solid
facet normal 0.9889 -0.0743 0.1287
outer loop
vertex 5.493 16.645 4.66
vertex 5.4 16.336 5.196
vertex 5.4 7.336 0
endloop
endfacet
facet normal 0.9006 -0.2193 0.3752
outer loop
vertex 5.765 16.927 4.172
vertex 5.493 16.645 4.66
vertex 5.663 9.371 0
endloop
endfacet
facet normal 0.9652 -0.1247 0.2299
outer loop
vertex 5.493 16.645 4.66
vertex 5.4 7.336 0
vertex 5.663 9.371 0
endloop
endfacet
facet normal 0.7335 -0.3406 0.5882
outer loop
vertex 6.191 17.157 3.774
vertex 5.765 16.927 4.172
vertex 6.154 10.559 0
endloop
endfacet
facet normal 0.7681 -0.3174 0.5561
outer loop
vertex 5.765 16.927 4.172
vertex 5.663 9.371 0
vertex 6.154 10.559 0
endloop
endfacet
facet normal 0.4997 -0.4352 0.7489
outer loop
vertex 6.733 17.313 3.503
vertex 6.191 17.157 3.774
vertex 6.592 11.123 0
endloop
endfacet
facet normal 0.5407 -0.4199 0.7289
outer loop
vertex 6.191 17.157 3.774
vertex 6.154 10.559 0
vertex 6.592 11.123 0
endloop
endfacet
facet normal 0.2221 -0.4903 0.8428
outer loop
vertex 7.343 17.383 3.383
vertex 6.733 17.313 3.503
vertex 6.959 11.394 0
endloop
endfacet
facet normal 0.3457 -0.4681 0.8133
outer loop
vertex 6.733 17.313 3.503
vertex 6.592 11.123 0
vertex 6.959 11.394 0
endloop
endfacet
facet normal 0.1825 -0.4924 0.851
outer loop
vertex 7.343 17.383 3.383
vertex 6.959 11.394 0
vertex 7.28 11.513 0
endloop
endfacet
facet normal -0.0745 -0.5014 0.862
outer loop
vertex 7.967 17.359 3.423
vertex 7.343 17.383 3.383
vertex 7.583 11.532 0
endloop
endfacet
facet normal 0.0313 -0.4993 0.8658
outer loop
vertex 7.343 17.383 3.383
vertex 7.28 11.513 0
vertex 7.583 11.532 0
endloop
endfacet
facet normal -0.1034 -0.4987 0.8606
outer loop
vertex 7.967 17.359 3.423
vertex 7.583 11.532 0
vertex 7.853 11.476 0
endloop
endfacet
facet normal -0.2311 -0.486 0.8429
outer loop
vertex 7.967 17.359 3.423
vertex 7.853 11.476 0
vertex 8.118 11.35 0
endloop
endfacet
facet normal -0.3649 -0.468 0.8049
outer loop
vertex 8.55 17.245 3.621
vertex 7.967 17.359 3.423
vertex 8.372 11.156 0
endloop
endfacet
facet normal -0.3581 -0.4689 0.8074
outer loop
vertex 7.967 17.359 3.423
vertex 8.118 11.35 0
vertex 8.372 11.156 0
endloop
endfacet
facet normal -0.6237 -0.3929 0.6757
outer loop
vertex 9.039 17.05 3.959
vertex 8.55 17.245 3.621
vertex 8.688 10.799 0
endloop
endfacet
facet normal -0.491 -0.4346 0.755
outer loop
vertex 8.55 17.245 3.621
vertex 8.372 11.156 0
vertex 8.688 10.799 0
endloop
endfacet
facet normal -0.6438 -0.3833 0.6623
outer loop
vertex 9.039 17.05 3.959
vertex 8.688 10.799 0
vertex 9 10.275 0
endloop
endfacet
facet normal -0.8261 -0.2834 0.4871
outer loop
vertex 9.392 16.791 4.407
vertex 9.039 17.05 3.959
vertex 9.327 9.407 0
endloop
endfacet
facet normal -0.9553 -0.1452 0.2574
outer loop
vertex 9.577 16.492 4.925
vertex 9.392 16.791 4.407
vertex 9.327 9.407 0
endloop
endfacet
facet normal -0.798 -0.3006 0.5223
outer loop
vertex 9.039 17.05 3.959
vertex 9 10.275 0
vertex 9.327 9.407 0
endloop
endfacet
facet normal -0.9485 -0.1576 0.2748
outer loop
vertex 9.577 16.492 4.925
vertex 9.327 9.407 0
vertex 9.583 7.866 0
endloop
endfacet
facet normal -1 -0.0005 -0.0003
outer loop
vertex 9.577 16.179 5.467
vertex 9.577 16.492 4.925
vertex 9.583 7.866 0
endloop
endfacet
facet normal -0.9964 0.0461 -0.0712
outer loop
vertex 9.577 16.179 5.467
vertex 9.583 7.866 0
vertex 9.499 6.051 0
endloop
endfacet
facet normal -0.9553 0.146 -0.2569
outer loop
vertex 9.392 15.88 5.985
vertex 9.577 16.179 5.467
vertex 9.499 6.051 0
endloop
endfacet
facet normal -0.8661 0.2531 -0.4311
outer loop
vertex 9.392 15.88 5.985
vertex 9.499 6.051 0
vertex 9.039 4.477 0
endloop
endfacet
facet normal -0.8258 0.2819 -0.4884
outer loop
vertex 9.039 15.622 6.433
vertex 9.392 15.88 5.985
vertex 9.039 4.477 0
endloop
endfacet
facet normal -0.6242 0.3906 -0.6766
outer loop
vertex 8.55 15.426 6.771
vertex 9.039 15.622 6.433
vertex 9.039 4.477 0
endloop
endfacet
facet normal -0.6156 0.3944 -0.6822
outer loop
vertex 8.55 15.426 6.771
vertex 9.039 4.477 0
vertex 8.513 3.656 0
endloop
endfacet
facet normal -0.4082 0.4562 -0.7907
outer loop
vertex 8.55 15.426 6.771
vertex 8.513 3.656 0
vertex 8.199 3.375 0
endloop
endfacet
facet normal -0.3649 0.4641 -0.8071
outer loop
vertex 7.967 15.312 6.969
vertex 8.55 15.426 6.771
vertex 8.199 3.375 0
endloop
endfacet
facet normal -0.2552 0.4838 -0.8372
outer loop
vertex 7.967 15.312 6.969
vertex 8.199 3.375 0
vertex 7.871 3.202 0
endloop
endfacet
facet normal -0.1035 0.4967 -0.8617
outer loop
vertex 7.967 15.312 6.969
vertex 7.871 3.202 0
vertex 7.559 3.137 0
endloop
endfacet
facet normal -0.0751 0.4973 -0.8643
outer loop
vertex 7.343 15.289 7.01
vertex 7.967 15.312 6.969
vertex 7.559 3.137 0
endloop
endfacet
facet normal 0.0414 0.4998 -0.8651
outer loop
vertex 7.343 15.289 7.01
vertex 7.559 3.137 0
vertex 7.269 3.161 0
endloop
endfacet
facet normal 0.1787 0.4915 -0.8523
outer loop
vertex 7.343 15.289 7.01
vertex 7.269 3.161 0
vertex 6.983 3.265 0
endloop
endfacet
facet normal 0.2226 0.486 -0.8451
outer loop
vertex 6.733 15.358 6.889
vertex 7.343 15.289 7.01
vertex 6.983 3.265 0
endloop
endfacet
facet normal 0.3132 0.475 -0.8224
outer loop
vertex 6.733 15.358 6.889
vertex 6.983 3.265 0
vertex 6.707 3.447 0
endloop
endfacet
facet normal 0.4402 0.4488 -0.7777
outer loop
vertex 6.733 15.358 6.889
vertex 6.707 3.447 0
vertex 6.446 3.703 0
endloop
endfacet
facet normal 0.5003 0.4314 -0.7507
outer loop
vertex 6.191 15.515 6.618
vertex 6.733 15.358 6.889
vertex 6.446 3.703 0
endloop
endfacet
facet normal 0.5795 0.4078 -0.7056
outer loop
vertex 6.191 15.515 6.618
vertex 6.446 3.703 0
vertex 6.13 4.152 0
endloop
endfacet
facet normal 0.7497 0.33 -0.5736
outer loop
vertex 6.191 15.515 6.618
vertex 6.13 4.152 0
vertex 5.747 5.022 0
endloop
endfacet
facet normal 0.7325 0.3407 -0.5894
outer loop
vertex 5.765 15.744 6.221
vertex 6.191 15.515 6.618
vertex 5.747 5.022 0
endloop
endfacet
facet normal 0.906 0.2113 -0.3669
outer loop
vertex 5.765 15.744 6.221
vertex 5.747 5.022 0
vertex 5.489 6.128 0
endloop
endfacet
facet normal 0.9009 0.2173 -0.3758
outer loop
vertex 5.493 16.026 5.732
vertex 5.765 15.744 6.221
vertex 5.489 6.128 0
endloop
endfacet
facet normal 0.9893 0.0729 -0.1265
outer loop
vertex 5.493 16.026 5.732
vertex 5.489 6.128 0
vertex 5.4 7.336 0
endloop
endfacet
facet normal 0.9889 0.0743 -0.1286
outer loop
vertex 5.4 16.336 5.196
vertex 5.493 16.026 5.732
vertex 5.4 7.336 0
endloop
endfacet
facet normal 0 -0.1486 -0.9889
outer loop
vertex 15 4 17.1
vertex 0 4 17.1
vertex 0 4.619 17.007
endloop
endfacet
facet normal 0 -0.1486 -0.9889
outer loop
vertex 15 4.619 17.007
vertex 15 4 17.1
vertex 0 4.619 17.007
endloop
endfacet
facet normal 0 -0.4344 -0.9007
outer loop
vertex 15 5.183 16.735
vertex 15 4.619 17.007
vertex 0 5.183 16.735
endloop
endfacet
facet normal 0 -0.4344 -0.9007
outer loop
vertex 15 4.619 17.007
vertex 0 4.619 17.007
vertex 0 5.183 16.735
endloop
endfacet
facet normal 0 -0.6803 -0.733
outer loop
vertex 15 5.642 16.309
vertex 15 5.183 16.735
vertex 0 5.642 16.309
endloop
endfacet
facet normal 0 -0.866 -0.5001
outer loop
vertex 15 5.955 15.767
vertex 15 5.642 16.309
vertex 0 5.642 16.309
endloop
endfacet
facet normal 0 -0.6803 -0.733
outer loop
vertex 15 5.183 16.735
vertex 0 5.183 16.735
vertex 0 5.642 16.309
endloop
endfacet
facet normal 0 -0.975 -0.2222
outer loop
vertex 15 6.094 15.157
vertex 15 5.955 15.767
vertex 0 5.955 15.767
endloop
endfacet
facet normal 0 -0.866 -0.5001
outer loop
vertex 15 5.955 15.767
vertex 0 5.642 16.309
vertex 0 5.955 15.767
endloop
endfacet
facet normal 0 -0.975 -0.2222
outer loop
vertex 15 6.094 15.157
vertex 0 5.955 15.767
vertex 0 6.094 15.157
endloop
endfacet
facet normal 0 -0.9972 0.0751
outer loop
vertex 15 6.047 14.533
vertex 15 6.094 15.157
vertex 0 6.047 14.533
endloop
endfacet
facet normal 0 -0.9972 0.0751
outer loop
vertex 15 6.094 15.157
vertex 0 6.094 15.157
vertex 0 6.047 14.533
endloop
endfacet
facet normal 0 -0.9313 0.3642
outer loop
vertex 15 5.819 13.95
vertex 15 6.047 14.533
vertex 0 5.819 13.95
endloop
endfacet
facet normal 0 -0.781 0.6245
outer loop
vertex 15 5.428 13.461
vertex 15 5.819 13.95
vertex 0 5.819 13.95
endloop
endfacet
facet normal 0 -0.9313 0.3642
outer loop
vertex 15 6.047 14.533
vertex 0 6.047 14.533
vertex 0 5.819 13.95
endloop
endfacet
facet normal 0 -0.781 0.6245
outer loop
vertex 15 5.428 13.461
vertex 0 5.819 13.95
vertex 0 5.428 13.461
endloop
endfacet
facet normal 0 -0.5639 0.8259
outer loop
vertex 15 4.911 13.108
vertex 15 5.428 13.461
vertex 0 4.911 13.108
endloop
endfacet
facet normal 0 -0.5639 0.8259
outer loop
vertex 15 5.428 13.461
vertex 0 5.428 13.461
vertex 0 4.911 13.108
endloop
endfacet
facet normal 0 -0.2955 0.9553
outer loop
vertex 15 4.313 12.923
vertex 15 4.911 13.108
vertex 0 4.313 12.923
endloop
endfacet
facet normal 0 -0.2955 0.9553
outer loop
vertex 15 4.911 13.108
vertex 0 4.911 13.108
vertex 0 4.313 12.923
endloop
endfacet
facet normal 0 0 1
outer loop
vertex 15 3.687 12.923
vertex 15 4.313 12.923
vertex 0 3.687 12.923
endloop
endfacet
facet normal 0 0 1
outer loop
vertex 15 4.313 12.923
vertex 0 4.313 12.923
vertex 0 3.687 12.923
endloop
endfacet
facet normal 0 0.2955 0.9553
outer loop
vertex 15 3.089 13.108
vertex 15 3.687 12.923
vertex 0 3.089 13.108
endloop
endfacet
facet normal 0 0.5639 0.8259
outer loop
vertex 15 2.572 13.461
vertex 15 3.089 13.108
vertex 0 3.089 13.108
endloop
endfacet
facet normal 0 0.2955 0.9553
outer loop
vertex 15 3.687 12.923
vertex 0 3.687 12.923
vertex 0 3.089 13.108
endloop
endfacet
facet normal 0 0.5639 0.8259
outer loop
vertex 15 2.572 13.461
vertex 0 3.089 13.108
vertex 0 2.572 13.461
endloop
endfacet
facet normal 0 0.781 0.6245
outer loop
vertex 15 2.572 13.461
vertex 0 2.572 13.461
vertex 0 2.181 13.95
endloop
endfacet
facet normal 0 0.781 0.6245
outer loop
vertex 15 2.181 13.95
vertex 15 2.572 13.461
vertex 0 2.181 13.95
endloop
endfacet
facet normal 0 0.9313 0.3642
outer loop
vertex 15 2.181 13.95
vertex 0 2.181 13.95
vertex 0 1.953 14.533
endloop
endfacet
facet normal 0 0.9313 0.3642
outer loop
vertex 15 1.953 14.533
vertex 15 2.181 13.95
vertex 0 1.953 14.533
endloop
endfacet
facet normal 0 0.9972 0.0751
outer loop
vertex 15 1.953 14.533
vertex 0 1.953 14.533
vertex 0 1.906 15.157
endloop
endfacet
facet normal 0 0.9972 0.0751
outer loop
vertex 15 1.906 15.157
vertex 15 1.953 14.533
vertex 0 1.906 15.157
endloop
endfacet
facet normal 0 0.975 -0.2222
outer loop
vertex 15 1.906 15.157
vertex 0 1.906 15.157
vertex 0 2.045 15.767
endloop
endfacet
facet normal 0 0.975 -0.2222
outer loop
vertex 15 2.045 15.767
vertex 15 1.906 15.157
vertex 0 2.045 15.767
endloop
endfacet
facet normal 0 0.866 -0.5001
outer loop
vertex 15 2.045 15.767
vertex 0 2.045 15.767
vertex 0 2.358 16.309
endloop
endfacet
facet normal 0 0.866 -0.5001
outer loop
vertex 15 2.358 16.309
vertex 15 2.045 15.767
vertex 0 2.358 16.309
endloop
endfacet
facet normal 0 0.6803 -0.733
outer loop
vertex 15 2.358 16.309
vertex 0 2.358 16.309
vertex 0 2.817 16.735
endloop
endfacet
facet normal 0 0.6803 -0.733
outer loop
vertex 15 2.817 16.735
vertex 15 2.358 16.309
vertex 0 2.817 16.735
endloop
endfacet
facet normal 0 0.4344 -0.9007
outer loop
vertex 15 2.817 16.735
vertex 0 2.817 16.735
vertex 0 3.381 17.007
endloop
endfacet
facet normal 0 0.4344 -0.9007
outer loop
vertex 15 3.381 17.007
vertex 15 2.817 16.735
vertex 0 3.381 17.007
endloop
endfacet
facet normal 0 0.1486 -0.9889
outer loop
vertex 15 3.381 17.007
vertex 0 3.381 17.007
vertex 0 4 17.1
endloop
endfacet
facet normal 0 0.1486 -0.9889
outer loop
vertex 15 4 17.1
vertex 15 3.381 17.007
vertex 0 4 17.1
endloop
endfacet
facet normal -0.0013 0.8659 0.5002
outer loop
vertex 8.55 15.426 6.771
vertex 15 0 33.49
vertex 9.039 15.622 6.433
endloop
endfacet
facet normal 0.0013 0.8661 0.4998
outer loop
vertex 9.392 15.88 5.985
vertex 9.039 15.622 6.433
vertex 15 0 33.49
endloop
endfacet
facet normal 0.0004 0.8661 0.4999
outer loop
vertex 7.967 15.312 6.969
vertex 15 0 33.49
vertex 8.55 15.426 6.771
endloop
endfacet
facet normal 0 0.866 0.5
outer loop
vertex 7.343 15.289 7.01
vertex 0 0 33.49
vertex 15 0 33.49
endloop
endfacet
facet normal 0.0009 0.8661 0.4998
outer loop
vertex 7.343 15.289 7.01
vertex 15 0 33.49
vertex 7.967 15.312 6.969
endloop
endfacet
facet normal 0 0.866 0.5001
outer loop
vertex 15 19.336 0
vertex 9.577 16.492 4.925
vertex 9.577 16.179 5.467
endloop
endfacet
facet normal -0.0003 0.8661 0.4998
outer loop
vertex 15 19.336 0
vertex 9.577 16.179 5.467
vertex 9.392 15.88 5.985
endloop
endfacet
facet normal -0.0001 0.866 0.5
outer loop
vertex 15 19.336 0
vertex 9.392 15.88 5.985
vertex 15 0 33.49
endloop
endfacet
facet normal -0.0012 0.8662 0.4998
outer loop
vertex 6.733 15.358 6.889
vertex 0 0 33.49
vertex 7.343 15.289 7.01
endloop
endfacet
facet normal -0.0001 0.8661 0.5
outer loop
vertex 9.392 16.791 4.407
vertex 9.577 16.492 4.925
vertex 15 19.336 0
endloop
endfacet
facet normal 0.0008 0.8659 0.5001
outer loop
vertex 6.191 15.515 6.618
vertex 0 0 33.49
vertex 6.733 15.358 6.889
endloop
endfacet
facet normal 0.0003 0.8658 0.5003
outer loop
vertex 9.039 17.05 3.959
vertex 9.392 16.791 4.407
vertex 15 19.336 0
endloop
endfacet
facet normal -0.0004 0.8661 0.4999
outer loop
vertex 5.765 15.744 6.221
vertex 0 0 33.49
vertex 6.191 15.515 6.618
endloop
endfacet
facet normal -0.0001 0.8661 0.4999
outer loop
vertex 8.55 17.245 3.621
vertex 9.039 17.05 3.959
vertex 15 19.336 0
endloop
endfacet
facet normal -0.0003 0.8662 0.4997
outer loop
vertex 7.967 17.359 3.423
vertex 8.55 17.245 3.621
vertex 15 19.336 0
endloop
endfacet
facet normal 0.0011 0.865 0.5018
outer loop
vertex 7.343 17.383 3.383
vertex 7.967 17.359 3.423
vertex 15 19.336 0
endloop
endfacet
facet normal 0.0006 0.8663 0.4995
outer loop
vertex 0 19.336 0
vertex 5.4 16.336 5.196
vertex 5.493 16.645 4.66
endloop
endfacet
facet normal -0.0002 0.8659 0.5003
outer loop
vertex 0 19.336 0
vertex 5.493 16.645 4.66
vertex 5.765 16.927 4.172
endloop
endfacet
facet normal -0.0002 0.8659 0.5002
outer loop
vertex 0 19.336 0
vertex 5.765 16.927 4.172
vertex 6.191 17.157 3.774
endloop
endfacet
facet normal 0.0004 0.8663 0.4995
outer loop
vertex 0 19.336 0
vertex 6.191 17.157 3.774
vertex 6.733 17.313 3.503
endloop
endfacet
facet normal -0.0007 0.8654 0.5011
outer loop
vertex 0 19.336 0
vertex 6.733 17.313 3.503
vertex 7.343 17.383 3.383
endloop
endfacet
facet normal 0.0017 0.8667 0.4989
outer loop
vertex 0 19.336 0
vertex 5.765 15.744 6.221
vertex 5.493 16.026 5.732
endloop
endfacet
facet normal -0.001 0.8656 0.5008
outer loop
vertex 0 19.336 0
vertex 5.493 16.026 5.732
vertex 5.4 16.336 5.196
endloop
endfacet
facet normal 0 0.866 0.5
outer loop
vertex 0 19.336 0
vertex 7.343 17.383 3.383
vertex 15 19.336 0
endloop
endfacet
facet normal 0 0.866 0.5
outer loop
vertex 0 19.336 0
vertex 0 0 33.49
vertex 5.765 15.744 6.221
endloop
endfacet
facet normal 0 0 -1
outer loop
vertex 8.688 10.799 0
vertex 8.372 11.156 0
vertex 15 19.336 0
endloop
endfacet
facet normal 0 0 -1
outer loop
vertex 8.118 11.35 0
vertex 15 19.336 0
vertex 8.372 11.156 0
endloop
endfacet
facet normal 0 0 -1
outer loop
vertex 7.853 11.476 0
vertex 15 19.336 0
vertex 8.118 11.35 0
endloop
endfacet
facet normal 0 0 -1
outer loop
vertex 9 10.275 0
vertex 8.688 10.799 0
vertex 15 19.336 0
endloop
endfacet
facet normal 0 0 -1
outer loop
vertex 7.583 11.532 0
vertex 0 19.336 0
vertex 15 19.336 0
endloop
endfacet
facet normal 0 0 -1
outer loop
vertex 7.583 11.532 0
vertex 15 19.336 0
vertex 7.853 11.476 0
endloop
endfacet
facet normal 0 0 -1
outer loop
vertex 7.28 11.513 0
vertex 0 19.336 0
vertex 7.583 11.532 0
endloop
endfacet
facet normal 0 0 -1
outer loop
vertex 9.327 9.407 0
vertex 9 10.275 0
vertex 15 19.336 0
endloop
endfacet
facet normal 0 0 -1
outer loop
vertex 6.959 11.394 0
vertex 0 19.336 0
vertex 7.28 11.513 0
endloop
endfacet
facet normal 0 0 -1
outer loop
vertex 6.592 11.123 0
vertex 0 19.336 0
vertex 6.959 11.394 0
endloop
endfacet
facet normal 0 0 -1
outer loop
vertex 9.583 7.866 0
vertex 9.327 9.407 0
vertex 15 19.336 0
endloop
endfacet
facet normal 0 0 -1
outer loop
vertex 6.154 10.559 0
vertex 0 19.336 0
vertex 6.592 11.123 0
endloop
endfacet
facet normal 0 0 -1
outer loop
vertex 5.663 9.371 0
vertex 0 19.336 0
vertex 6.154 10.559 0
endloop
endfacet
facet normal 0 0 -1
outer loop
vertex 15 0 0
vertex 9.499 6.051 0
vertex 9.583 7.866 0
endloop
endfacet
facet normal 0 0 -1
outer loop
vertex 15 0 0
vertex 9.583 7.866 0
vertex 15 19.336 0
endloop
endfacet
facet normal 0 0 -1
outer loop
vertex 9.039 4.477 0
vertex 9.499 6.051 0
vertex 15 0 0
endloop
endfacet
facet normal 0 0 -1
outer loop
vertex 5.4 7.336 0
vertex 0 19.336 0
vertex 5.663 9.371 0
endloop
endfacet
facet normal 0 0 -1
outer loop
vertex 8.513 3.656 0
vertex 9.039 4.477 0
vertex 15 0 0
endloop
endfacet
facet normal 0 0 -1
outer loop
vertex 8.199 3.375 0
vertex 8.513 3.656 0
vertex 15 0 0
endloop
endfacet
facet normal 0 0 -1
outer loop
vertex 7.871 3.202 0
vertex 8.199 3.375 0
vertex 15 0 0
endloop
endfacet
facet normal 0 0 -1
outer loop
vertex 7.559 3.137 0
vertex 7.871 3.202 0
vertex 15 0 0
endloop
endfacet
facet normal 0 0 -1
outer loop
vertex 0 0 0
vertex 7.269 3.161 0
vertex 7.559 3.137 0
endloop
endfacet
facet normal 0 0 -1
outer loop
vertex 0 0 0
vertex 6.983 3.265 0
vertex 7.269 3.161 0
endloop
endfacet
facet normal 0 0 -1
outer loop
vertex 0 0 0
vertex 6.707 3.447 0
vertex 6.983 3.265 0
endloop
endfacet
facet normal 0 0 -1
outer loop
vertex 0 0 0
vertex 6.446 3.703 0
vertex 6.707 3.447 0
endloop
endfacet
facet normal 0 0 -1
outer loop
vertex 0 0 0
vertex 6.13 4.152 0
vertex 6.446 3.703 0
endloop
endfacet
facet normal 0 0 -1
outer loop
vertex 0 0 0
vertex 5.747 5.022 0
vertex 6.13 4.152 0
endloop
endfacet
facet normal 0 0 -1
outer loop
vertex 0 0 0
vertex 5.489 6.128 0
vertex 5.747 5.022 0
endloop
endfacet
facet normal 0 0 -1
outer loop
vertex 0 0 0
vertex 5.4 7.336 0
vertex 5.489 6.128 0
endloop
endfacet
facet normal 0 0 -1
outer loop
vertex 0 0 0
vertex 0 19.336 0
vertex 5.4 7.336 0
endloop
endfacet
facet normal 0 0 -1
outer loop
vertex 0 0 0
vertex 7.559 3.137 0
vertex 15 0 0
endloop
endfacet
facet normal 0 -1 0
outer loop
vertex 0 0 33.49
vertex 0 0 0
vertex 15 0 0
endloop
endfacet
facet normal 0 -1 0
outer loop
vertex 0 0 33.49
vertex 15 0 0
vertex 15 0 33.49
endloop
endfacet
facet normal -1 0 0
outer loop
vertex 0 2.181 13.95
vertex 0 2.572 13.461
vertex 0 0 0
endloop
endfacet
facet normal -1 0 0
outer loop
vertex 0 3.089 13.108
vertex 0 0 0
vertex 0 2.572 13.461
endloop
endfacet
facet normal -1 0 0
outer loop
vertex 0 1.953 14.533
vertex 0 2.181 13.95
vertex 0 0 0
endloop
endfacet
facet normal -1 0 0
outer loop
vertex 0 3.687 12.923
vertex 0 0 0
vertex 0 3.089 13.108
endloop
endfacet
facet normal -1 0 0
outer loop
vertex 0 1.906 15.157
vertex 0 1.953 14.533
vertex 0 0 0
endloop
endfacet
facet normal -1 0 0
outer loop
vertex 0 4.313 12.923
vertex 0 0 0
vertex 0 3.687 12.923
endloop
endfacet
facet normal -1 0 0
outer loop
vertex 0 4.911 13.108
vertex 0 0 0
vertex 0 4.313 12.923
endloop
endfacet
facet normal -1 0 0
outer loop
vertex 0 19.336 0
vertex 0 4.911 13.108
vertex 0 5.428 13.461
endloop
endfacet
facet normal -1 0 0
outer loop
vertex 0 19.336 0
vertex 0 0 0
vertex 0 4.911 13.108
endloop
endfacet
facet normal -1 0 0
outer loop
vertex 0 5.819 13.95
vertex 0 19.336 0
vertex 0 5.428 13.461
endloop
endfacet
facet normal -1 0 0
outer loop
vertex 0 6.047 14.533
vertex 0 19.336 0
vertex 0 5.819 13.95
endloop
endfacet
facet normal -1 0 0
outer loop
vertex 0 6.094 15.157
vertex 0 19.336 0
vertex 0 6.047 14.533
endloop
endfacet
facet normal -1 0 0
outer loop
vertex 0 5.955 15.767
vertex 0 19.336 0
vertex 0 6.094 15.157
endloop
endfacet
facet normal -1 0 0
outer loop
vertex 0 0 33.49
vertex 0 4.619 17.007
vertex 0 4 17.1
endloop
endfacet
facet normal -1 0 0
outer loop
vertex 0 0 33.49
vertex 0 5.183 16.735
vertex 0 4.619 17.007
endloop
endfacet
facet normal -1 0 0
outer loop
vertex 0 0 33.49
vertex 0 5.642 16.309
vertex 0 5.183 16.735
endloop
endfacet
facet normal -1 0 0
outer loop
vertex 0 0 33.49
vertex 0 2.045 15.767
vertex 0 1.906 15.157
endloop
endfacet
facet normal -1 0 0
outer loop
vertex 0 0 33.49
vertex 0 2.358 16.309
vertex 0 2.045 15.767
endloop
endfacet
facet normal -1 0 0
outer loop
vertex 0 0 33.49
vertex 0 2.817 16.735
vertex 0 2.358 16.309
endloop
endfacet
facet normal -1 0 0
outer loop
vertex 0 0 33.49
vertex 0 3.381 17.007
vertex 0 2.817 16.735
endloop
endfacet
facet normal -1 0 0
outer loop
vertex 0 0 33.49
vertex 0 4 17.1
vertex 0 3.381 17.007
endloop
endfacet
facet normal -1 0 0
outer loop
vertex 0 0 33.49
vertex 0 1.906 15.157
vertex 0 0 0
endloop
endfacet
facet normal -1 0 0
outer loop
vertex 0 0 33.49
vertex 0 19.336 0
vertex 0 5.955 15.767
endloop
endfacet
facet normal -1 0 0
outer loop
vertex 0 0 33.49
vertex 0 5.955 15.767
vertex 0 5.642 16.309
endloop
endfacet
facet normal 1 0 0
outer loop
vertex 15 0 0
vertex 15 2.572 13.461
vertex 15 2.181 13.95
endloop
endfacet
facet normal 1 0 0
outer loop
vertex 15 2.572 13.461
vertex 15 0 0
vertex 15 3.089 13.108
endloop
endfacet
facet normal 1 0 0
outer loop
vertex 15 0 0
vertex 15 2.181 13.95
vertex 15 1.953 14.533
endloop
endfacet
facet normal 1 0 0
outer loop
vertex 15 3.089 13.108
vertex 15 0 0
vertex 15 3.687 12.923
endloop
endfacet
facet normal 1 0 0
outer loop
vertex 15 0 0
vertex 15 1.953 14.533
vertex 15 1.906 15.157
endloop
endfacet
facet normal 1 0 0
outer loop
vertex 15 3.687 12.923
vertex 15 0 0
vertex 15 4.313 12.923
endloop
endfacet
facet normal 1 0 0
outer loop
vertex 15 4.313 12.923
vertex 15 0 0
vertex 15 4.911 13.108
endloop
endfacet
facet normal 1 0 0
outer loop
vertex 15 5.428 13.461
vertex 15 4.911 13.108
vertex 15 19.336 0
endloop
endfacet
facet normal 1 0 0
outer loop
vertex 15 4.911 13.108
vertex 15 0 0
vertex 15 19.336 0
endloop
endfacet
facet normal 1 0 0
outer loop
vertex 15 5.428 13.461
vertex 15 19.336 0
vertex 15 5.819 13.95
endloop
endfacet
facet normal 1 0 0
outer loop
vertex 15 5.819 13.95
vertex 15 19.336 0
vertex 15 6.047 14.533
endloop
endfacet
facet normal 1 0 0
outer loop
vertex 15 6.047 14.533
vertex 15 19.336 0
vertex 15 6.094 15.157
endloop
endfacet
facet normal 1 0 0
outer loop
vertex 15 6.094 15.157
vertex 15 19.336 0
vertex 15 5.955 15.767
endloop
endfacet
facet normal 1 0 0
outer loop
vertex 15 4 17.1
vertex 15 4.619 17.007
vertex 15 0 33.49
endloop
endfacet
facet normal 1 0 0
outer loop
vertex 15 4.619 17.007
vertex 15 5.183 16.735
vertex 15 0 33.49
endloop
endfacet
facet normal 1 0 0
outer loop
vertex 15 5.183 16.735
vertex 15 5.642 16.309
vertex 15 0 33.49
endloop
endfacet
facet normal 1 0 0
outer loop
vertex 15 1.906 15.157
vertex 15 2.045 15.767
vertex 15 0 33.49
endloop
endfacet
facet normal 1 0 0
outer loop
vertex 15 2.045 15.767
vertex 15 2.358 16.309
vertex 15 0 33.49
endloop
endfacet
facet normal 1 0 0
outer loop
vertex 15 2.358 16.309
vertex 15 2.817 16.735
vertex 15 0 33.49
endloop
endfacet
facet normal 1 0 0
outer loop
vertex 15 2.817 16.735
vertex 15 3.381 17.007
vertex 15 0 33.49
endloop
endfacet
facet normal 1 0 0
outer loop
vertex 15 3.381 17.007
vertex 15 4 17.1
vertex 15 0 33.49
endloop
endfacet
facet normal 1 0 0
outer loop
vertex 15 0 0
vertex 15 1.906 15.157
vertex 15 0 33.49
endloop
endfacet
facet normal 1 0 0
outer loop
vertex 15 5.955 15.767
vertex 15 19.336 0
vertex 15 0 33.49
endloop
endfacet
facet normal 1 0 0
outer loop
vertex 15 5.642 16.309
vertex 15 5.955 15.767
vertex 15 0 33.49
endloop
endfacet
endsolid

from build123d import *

# Parameters (mm, degrees)
BOSS_EXTRUDE1_DEPTH   = 15
M5X0_8_TAPPED_HOLE1_D = 4.2
M5X0_8_TAPPED_HOLE2_D = 4.2


with BuildPart() as part:
    # Sketch3 → Boss-Extrude1 (new body)
    with BuildSketch(Plane(origin=(0, 0, 0), x_dir=(0, 0, -1), z_dir=(1, 0, 0))):
        Polygon((0, 0), (-33.49045709, 0), (0, 19.335724416), align=None)
    extrude(amount=BOSS_EXTRUDE1_DEPTH)

    # M5x0.8 Tapped Hole1 (through all)
    with Locations(Plane(origin=(15, 0, 0), x_dir=(0, 0, -1), z_dir=(1, 0, 0))):
        with Locations((-15, 4)):
            Hole(M5X0_8_TAPPED_HOLE1_D / 2)

    # M5x0.8 Tapped Hole2 (through all)
    with Locations(Plane(origin=(0, 14.501793312, 8.372614273), x_dir=(1, 0, 0), z_dir=(0, 0.866025404, 0.5))):
        with Locations((7.5, 3.667862208)):
            Hole(M5X0_8_TAPPED_HOLE2_D / 2)


solid = part.part
